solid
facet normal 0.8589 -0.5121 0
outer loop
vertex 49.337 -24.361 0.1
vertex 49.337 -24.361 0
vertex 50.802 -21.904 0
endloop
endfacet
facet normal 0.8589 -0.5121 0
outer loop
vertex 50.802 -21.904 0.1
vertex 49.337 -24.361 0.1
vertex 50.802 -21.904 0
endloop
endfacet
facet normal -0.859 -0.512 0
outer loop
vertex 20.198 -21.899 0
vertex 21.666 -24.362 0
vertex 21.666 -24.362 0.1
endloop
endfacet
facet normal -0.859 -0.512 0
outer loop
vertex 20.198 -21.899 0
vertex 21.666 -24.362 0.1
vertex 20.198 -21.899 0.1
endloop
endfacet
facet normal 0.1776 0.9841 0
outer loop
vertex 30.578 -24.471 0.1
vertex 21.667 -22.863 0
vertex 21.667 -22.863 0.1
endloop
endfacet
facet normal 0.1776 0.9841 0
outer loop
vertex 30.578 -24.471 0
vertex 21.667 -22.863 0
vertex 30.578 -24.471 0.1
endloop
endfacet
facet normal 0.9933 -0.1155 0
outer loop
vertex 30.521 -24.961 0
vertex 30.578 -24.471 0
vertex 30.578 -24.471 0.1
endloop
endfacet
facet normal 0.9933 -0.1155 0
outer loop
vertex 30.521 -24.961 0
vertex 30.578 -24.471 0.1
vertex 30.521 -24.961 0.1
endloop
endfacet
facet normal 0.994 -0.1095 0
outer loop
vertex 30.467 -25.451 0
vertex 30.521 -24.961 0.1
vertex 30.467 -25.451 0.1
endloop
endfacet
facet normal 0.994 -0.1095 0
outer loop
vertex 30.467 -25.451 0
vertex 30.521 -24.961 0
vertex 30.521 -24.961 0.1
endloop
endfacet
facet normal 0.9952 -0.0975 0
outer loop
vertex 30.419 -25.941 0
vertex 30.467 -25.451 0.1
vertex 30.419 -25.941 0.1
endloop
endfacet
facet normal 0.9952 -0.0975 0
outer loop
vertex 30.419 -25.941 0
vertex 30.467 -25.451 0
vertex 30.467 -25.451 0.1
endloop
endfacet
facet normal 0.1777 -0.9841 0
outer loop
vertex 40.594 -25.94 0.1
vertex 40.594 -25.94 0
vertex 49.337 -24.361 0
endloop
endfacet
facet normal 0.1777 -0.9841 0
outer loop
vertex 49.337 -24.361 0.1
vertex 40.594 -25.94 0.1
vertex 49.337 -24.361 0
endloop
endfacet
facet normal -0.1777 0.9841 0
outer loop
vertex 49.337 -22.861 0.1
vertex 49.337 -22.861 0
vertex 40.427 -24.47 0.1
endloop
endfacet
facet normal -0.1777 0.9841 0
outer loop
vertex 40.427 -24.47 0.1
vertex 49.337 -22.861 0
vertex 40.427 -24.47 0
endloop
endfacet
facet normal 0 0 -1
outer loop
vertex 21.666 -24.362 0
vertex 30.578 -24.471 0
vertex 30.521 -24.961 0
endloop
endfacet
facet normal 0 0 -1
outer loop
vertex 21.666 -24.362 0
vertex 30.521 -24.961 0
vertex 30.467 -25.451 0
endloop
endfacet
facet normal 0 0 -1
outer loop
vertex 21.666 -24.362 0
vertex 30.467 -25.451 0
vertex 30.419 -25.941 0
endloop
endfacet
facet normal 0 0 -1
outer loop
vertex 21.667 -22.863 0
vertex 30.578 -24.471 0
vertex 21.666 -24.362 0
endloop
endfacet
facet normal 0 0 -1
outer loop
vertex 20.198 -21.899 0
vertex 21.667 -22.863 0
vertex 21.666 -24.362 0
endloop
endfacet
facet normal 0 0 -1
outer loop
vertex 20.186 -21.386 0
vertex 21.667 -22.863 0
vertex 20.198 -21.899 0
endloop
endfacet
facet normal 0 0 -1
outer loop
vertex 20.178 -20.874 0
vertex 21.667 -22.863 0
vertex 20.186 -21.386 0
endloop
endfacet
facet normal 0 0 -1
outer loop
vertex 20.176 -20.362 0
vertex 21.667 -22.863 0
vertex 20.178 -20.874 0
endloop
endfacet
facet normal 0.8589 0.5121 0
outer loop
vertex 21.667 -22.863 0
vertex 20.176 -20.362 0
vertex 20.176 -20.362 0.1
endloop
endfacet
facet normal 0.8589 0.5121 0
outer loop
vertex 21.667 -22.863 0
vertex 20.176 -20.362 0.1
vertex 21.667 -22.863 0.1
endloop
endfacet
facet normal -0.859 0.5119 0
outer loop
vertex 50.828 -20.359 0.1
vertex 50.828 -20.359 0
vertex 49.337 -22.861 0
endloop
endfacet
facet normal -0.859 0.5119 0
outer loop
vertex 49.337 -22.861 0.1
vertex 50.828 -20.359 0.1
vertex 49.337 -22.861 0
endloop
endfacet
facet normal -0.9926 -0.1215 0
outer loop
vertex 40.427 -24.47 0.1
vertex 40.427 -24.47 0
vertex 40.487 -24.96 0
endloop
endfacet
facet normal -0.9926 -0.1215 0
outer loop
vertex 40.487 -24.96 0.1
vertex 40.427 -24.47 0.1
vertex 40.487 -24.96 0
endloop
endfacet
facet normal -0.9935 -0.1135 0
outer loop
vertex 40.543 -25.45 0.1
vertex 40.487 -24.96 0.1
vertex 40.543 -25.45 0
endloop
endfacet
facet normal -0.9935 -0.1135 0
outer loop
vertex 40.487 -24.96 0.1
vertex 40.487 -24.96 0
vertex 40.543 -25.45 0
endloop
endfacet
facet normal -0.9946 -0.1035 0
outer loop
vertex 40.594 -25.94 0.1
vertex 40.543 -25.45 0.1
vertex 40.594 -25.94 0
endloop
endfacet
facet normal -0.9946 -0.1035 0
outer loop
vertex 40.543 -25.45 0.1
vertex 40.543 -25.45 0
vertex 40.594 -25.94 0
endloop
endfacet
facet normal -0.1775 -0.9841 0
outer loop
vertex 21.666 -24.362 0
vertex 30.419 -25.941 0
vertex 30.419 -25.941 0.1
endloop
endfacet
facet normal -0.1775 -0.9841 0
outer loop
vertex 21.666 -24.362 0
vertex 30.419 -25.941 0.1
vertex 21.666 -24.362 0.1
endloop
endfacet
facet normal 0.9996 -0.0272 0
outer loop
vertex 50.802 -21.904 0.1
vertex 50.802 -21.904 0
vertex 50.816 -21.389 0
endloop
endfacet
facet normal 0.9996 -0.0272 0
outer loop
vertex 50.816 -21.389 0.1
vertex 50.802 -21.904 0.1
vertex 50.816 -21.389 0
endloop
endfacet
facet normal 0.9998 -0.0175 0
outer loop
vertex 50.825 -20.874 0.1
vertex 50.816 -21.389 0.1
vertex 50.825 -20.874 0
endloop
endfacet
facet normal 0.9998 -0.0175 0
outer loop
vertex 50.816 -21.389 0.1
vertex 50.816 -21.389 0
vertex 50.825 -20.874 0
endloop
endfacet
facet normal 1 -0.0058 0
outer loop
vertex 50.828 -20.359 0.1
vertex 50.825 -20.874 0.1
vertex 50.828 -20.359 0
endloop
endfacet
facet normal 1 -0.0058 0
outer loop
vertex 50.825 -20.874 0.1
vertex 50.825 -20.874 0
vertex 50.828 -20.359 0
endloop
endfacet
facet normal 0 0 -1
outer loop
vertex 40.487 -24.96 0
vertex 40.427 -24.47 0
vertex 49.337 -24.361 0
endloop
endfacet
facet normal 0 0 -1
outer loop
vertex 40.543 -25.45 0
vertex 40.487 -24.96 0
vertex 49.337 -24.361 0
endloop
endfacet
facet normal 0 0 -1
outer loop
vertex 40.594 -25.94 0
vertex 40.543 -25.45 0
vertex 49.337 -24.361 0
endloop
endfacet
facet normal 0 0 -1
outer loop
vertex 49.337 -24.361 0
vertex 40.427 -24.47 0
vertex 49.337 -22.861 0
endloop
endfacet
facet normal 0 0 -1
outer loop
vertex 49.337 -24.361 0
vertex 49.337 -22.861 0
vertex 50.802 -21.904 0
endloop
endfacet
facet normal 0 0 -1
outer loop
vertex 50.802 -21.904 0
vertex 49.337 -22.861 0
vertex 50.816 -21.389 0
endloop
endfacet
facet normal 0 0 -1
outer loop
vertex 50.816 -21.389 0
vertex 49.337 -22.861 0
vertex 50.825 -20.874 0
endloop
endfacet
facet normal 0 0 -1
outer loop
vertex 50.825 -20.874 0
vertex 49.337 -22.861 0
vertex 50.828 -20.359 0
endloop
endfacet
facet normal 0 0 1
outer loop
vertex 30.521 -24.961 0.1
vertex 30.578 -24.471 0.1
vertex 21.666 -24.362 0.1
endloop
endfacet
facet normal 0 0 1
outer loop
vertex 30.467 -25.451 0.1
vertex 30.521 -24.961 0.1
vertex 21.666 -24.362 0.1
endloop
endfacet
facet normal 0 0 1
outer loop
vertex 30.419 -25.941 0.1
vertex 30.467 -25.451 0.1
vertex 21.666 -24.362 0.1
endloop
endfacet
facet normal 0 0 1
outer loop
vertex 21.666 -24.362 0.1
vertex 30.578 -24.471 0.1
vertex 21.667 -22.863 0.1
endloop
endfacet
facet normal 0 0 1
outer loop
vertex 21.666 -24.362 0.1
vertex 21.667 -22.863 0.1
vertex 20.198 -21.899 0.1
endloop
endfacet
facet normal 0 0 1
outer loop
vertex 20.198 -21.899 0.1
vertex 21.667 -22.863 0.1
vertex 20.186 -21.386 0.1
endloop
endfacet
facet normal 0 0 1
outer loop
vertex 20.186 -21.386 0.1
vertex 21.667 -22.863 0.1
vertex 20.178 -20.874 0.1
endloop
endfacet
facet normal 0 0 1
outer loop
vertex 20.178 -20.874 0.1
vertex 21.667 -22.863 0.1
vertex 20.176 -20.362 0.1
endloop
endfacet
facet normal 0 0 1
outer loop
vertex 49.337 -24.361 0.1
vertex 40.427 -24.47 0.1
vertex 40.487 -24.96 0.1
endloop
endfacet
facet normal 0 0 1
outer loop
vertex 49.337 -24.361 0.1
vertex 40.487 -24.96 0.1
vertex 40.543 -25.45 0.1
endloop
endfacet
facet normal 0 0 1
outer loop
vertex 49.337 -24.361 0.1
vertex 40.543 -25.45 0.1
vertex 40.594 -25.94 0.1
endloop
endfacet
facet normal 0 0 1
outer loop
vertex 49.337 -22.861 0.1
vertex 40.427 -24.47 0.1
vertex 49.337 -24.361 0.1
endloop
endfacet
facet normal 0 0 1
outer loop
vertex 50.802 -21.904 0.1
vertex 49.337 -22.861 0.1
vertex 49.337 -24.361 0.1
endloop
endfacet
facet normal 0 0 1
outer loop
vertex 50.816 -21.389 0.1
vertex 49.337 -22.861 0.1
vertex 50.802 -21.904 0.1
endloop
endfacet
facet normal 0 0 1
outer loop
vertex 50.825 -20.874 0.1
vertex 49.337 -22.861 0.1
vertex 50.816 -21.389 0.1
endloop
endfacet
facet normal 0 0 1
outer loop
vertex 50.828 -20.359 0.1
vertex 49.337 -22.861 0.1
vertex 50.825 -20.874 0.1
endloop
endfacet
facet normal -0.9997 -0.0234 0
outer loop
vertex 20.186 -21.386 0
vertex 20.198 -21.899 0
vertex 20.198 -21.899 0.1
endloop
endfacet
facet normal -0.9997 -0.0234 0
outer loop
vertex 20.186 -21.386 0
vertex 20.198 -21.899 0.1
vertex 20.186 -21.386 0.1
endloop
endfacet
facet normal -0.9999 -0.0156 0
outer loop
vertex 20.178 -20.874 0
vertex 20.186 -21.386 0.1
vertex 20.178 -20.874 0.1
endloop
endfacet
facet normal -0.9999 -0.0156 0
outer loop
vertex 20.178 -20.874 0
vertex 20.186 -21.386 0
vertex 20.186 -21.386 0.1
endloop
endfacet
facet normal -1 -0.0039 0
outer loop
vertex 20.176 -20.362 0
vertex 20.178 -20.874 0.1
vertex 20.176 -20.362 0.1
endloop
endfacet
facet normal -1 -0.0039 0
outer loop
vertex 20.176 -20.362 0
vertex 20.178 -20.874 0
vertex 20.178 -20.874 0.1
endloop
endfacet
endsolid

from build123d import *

# Parameters (mm, degrees)
SALIENTE_EXTRUIR1_DEPTH   = 0.1
SALIENTE_EXTRUIR1_2_DEPTH = 0.1


with BuildPart() as part:
    # Model → Saliente-Extruir1 (new body)
    with BuildSketch(Plane.XY):
        with BuildLine():
            ThreePointArc((30.578340462, -24.471121474), (30.493407947, -25.205745326), (30.418644104, -25.941473607))
            Line((30.418644104, -25.941473607), (21.66634164, -24.362151891))
            Line((21.66634164, -24.362151891), (20.197690678, -21.898713264))
            ThreePointArc((20.197690678, -21.898713264), (20.181421827, -21.130225351), (20.176063282, -20.36158393))
            Line((20.176063282, -20.36158393), (21.667447642, -22.862862326))
            Line((21.667447642, -22.862862326), (30.578340462, -24.471121474))
        make_face()
    extrude(amount=SALIENTE_EXTRUIR1_DEPTH)


with BuildPart() as body_2:
    # Model → Saliente-Extruir1 2 (new body)
    with BuildSketch(Plane.XY):
        with BuildLine():
            Line((49.337355198, -24.360837656), (50.80165197, -21.904172006))
            ThreePointArc((50.80165197, -21.904172006), (50.820972205, -21.131859602), (50.828373494, -20.359341031))
            Line((50.828373494, -20.359341031), (49.337355198, -22.860837656))
            Line((49.337355198, -22.860837656), (40.426697834, -24.470400847))
            ThreePointArc((40.426697834, -24.470400847), (40.51513452, -25.204736786), (40.594249402, -25.940135422))
            Line((40.594249402, -25.940135422), (49.337355198, -24.360837656))
        make_face()
    extrude(amount=SALIENTE_EXTRUIR1_2_DEPTH)


solid = Compound([part.part, body_2.part])
